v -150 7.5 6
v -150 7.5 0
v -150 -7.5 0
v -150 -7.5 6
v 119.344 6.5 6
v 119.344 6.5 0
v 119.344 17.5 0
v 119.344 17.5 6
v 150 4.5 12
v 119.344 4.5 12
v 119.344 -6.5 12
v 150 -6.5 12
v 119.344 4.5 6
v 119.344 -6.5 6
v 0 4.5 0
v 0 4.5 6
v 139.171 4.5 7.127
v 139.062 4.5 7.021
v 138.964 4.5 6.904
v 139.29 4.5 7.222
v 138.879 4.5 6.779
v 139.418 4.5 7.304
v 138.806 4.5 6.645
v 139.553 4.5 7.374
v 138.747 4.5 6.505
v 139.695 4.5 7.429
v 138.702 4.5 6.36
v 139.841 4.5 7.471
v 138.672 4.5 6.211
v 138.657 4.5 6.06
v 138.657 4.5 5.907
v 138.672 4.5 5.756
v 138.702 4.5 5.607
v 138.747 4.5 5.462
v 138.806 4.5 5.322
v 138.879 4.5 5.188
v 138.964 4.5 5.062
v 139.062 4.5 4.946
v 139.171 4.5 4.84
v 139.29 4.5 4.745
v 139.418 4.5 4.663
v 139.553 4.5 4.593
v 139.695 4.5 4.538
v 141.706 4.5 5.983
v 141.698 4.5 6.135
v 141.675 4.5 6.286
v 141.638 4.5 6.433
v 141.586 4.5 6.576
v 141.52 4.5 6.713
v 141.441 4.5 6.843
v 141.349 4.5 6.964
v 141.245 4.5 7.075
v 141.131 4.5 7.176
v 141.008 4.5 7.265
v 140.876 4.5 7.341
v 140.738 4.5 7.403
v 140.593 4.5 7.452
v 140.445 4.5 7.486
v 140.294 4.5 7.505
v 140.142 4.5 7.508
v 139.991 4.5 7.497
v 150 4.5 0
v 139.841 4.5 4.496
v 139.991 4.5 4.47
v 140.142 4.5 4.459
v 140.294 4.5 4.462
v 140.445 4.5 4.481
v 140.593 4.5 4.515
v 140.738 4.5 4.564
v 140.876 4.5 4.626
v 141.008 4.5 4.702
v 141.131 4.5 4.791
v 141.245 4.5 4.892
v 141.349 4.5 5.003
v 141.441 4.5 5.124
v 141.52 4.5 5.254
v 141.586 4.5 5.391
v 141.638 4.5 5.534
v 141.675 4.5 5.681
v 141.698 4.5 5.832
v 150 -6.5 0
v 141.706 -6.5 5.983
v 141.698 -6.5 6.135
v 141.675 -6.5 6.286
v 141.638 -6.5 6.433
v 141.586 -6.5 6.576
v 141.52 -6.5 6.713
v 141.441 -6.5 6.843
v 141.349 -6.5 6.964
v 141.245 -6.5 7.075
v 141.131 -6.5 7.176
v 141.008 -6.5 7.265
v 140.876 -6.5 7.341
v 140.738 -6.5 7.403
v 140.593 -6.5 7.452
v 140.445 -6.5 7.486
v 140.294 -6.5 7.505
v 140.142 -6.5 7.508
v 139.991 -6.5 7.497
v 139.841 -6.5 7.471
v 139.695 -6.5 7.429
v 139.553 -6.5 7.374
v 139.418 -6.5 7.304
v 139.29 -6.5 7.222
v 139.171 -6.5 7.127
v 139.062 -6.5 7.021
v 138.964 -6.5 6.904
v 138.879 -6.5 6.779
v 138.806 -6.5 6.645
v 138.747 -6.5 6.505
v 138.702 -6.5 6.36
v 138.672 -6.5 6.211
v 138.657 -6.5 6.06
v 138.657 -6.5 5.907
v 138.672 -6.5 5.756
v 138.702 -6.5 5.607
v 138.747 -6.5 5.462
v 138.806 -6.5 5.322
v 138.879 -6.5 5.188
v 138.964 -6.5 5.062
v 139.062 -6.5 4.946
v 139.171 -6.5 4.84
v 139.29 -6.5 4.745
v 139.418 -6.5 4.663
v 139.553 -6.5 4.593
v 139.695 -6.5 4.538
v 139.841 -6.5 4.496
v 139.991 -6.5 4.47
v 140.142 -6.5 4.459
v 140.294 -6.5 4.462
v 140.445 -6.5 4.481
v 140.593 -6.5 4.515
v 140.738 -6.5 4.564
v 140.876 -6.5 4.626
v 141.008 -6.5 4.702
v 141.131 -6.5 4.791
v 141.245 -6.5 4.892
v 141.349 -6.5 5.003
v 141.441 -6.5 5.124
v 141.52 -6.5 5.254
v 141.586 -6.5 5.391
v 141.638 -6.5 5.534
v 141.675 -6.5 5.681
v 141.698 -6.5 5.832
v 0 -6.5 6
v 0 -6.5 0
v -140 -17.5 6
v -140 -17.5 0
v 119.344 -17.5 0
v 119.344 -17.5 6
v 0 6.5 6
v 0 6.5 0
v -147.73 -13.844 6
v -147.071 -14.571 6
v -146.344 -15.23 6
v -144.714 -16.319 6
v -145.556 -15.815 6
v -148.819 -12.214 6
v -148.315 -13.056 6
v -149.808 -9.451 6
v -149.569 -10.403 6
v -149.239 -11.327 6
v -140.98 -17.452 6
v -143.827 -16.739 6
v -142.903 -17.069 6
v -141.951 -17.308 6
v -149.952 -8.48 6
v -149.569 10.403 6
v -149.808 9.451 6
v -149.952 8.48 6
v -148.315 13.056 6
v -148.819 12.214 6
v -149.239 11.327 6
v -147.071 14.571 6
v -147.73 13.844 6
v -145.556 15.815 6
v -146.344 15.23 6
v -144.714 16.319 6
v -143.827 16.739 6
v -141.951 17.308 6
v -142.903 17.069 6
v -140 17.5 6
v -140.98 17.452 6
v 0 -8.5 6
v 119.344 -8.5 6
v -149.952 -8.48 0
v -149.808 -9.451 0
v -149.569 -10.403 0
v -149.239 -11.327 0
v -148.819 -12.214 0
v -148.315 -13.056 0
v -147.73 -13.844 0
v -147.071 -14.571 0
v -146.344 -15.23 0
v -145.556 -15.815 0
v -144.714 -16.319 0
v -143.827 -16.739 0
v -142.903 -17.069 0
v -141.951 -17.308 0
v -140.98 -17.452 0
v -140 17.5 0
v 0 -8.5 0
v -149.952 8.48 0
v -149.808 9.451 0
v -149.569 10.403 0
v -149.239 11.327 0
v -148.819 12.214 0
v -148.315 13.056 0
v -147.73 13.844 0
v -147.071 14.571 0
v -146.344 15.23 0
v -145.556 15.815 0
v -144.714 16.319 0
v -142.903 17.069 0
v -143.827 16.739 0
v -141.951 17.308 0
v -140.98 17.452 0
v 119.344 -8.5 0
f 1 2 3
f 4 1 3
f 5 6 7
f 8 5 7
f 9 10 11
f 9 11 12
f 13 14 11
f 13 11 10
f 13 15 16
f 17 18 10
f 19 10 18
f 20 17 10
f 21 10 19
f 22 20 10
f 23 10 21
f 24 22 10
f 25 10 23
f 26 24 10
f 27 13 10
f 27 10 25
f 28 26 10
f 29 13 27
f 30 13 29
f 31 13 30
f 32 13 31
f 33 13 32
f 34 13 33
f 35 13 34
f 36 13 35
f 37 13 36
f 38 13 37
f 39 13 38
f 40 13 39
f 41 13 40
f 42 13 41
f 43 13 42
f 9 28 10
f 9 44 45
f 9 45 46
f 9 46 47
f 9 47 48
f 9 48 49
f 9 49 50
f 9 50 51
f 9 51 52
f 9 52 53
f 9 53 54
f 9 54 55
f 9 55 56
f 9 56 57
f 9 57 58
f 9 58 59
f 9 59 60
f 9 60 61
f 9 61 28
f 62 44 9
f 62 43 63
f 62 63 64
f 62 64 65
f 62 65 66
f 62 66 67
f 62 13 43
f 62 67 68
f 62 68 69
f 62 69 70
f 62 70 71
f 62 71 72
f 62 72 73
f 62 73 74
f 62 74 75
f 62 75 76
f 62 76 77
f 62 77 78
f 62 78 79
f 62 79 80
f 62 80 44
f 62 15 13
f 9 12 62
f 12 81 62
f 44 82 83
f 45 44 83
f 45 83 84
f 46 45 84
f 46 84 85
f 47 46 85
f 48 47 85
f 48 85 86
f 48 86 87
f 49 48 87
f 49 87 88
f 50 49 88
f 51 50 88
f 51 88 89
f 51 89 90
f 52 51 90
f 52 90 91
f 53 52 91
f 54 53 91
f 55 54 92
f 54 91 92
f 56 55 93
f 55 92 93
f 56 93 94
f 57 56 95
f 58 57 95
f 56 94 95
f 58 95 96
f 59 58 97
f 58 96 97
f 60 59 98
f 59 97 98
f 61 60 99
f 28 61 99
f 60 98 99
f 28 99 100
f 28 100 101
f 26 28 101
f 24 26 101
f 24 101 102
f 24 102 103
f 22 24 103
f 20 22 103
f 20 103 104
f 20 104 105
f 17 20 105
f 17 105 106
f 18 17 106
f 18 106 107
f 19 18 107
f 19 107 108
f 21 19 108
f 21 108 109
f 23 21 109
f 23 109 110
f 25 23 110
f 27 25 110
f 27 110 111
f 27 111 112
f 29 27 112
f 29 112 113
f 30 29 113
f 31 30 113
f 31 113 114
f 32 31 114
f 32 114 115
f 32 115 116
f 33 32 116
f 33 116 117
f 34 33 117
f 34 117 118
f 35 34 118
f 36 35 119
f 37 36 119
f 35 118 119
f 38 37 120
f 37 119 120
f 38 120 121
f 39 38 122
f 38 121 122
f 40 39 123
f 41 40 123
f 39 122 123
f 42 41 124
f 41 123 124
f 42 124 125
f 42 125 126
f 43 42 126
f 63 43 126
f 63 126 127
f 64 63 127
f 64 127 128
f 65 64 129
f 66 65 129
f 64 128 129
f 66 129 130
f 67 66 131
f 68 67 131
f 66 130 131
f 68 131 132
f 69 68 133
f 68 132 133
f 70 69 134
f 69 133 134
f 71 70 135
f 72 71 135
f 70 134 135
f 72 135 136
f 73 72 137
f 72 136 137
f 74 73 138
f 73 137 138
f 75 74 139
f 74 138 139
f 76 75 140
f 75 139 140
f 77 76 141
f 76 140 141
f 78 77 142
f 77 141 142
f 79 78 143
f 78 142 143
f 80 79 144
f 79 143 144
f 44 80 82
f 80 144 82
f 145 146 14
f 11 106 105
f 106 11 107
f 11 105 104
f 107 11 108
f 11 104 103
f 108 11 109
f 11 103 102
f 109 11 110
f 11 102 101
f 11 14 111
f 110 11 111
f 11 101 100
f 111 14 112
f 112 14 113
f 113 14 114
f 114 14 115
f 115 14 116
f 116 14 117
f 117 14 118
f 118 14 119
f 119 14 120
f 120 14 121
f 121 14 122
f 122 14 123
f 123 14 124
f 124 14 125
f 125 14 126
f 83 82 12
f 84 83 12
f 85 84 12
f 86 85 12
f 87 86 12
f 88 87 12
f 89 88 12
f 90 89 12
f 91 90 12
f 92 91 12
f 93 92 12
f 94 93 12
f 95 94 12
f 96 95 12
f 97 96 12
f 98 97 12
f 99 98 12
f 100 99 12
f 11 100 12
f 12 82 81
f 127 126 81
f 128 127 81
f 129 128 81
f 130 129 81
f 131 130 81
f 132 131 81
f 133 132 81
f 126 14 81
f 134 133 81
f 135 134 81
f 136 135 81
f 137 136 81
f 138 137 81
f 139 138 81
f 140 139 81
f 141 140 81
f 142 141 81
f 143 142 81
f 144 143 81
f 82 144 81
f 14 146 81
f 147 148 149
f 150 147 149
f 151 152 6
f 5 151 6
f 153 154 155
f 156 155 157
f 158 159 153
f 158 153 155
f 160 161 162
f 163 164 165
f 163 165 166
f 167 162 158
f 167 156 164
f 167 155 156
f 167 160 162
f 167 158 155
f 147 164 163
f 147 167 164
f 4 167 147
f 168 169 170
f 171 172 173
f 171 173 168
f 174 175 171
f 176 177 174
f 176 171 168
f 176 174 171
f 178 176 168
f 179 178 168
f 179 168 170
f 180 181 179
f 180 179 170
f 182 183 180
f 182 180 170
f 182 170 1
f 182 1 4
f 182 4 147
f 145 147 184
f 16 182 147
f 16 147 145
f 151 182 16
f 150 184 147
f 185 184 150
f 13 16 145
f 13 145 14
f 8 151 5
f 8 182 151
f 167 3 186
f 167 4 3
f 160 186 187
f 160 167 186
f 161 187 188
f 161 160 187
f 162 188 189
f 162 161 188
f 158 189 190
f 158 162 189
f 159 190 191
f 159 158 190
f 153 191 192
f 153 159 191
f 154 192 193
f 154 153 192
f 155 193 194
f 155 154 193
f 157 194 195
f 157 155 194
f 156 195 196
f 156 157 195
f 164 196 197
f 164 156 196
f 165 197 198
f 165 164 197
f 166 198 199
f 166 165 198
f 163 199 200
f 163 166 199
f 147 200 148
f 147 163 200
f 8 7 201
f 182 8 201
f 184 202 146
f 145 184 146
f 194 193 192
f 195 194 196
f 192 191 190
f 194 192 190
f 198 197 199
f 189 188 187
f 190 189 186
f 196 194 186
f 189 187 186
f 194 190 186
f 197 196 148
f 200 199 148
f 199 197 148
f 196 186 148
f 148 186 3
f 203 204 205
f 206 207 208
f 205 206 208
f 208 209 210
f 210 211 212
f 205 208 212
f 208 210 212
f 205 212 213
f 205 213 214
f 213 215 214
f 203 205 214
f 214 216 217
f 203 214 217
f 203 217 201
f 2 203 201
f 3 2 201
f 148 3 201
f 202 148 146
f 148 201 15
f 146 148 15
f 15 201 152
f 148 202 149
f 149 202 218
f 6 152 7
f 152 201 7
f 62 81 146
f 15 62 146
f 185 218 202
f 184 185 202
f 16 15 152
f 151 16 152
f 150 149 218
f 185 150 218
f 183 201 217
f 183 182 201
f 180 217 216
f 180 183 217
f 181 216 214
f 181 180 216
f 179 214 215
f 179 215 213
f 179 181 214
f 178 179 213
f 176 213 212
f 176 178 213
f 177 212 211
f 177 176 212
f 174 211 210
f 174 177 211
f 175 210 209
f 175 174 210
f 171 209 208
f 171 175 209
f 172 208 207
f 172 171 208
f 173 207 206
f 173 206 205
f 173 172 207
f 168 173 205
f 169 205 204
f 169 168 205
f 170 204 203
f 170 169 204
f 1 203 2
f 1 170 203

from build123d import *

# Parameters (mm, degrees)
F1_DEPTH = 6
F2_R     = 10
F3_W     = 30.655736
F3_H     = 11
F4_DEPTH = 6
F5_R     = 1.525335
F6_DEPTH = 11.4


with BuildPart() as f1:
    # F0 (on Top) → F1 (new body)
    with BuildSketch(Plane.XY):
        Polygon((119.344264, 17.5), (-150, 17.5), (-150, -17.5), (119.344264, -17.5), (119.344264, -8.5), (0, -8.5), (0, -6.5), (150, -6.5), (150, 4.5), (0, 4.5), (0, 6.5), (119.344264, 6.5), align=None)
    extrude(amount=F1_DEPTH)

    # F2
    f2_edges = [f1.edges().sort_by_distance(p)[0] for p in [
        (-150, -17.5, 3),
        (-150, 17.5, 3),
    ]]
    fillet(f2_edges, radius=F2_R)

    # F3 (on face) → F4 (join)
    with BuildSketch(Plane.XY.offset(6)):
        with Locations((134.672132, -1)):
            Rectangle(F3_W, F3_H)
    extrude(amount=F4_DEPTH)

    # F5 (on face) → F6 (cut)
    with BuildSketch(Plane.XZ.offset(6.5)):
        with Locations((140.18032, 5.98348)):
            Circle(F5_R)
    extrude(amount=-F6_DEPTH, mode=Mode.SUBTRACT)


solid = f1.part
